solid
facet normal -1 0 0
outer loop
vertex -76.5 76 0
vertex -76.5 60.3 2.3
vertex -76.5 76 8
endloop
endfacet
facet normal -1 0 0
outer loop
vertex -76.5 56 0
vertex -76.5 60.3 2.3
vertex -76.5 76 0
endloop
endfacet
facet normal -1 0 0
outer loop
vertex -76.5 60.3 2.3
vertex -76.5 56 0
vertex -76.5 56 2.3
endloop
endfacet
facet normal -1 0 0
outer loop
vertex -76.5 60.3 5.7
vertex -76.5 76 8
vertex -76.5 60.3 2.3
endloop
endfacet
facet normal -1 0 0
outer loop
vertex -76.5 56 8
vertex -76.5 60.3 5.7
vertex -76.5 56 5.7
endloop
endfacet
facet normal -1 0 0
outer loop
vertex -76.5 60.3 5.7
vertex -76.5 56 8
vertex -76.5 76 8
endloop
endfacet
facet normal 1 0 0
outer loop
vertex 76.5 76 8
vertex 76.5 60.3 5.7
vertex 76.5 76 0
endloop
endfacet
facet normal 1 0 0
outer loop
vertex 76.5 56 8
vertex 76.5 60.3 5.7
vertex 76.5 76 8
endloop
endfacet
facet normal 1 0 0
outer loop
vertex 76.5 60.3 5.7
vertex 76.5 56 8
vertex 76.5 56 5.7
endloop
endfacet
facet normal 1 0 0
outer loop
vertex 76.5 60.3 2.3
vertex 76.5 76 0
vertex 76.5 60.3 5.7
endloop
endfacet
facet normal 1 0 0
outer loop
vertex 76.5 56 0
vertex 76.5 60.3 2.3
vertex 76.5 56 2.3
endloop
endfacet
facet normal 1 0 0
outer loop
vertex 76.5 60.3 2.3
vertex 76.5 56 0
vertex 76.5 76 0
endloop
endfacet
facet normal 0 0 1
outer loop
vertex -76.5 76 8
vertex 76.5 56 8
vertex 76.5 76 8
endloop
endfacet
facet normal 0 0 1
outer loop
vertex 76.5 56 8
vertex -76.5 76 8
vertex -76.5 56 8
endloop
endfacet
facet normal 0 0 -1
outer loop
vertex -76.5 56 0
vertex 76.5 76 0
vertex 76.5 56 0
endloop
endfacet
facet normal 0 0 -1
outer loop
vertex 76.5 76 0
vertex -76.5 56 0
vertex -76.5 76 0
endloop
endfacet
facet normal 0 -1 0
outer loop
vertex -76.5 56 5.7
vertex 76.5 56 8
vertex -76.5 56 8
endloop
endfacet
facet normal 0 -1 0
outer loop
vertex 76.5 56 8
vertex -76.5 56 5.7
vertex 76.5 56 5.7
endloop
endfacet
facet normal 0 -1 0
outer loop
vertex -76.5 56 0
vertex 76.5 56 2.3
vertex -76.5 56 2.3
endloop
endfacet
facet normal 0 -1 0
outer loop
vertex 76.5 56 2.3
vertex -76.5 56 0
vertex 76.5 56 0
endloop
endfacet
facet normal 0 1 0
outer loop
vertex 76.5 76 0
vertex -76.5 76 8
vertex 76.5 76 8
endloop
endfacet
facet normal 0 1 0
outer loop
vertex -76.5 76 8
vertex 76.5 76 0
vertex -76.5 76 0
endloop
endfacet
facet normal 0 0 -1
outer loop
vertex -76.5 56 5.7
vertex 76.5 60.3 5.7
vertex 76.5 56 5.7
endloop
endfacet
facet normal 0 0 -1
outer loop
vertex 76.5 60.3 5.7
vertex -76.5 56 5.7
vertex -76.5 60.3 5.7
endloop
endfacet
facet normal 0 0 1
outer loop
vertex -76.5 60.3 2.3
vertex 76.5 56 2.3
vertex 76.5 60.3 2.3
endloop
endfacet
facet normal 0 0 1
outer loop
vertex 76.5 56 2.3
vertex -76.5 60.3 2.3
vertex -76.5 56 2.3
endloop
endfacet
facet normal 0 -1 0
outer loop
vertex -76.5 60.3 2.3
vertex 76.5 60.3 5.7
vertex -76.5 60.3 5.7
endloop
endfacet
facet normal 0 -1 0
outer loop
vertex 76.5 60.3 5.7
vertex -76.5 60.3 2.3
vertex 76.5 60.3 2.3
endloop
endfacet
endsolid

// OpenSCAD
include <../lib/meshtastic-drybag-node-lib.scad>;
$fn = 40;
panel_bar_print(1);
